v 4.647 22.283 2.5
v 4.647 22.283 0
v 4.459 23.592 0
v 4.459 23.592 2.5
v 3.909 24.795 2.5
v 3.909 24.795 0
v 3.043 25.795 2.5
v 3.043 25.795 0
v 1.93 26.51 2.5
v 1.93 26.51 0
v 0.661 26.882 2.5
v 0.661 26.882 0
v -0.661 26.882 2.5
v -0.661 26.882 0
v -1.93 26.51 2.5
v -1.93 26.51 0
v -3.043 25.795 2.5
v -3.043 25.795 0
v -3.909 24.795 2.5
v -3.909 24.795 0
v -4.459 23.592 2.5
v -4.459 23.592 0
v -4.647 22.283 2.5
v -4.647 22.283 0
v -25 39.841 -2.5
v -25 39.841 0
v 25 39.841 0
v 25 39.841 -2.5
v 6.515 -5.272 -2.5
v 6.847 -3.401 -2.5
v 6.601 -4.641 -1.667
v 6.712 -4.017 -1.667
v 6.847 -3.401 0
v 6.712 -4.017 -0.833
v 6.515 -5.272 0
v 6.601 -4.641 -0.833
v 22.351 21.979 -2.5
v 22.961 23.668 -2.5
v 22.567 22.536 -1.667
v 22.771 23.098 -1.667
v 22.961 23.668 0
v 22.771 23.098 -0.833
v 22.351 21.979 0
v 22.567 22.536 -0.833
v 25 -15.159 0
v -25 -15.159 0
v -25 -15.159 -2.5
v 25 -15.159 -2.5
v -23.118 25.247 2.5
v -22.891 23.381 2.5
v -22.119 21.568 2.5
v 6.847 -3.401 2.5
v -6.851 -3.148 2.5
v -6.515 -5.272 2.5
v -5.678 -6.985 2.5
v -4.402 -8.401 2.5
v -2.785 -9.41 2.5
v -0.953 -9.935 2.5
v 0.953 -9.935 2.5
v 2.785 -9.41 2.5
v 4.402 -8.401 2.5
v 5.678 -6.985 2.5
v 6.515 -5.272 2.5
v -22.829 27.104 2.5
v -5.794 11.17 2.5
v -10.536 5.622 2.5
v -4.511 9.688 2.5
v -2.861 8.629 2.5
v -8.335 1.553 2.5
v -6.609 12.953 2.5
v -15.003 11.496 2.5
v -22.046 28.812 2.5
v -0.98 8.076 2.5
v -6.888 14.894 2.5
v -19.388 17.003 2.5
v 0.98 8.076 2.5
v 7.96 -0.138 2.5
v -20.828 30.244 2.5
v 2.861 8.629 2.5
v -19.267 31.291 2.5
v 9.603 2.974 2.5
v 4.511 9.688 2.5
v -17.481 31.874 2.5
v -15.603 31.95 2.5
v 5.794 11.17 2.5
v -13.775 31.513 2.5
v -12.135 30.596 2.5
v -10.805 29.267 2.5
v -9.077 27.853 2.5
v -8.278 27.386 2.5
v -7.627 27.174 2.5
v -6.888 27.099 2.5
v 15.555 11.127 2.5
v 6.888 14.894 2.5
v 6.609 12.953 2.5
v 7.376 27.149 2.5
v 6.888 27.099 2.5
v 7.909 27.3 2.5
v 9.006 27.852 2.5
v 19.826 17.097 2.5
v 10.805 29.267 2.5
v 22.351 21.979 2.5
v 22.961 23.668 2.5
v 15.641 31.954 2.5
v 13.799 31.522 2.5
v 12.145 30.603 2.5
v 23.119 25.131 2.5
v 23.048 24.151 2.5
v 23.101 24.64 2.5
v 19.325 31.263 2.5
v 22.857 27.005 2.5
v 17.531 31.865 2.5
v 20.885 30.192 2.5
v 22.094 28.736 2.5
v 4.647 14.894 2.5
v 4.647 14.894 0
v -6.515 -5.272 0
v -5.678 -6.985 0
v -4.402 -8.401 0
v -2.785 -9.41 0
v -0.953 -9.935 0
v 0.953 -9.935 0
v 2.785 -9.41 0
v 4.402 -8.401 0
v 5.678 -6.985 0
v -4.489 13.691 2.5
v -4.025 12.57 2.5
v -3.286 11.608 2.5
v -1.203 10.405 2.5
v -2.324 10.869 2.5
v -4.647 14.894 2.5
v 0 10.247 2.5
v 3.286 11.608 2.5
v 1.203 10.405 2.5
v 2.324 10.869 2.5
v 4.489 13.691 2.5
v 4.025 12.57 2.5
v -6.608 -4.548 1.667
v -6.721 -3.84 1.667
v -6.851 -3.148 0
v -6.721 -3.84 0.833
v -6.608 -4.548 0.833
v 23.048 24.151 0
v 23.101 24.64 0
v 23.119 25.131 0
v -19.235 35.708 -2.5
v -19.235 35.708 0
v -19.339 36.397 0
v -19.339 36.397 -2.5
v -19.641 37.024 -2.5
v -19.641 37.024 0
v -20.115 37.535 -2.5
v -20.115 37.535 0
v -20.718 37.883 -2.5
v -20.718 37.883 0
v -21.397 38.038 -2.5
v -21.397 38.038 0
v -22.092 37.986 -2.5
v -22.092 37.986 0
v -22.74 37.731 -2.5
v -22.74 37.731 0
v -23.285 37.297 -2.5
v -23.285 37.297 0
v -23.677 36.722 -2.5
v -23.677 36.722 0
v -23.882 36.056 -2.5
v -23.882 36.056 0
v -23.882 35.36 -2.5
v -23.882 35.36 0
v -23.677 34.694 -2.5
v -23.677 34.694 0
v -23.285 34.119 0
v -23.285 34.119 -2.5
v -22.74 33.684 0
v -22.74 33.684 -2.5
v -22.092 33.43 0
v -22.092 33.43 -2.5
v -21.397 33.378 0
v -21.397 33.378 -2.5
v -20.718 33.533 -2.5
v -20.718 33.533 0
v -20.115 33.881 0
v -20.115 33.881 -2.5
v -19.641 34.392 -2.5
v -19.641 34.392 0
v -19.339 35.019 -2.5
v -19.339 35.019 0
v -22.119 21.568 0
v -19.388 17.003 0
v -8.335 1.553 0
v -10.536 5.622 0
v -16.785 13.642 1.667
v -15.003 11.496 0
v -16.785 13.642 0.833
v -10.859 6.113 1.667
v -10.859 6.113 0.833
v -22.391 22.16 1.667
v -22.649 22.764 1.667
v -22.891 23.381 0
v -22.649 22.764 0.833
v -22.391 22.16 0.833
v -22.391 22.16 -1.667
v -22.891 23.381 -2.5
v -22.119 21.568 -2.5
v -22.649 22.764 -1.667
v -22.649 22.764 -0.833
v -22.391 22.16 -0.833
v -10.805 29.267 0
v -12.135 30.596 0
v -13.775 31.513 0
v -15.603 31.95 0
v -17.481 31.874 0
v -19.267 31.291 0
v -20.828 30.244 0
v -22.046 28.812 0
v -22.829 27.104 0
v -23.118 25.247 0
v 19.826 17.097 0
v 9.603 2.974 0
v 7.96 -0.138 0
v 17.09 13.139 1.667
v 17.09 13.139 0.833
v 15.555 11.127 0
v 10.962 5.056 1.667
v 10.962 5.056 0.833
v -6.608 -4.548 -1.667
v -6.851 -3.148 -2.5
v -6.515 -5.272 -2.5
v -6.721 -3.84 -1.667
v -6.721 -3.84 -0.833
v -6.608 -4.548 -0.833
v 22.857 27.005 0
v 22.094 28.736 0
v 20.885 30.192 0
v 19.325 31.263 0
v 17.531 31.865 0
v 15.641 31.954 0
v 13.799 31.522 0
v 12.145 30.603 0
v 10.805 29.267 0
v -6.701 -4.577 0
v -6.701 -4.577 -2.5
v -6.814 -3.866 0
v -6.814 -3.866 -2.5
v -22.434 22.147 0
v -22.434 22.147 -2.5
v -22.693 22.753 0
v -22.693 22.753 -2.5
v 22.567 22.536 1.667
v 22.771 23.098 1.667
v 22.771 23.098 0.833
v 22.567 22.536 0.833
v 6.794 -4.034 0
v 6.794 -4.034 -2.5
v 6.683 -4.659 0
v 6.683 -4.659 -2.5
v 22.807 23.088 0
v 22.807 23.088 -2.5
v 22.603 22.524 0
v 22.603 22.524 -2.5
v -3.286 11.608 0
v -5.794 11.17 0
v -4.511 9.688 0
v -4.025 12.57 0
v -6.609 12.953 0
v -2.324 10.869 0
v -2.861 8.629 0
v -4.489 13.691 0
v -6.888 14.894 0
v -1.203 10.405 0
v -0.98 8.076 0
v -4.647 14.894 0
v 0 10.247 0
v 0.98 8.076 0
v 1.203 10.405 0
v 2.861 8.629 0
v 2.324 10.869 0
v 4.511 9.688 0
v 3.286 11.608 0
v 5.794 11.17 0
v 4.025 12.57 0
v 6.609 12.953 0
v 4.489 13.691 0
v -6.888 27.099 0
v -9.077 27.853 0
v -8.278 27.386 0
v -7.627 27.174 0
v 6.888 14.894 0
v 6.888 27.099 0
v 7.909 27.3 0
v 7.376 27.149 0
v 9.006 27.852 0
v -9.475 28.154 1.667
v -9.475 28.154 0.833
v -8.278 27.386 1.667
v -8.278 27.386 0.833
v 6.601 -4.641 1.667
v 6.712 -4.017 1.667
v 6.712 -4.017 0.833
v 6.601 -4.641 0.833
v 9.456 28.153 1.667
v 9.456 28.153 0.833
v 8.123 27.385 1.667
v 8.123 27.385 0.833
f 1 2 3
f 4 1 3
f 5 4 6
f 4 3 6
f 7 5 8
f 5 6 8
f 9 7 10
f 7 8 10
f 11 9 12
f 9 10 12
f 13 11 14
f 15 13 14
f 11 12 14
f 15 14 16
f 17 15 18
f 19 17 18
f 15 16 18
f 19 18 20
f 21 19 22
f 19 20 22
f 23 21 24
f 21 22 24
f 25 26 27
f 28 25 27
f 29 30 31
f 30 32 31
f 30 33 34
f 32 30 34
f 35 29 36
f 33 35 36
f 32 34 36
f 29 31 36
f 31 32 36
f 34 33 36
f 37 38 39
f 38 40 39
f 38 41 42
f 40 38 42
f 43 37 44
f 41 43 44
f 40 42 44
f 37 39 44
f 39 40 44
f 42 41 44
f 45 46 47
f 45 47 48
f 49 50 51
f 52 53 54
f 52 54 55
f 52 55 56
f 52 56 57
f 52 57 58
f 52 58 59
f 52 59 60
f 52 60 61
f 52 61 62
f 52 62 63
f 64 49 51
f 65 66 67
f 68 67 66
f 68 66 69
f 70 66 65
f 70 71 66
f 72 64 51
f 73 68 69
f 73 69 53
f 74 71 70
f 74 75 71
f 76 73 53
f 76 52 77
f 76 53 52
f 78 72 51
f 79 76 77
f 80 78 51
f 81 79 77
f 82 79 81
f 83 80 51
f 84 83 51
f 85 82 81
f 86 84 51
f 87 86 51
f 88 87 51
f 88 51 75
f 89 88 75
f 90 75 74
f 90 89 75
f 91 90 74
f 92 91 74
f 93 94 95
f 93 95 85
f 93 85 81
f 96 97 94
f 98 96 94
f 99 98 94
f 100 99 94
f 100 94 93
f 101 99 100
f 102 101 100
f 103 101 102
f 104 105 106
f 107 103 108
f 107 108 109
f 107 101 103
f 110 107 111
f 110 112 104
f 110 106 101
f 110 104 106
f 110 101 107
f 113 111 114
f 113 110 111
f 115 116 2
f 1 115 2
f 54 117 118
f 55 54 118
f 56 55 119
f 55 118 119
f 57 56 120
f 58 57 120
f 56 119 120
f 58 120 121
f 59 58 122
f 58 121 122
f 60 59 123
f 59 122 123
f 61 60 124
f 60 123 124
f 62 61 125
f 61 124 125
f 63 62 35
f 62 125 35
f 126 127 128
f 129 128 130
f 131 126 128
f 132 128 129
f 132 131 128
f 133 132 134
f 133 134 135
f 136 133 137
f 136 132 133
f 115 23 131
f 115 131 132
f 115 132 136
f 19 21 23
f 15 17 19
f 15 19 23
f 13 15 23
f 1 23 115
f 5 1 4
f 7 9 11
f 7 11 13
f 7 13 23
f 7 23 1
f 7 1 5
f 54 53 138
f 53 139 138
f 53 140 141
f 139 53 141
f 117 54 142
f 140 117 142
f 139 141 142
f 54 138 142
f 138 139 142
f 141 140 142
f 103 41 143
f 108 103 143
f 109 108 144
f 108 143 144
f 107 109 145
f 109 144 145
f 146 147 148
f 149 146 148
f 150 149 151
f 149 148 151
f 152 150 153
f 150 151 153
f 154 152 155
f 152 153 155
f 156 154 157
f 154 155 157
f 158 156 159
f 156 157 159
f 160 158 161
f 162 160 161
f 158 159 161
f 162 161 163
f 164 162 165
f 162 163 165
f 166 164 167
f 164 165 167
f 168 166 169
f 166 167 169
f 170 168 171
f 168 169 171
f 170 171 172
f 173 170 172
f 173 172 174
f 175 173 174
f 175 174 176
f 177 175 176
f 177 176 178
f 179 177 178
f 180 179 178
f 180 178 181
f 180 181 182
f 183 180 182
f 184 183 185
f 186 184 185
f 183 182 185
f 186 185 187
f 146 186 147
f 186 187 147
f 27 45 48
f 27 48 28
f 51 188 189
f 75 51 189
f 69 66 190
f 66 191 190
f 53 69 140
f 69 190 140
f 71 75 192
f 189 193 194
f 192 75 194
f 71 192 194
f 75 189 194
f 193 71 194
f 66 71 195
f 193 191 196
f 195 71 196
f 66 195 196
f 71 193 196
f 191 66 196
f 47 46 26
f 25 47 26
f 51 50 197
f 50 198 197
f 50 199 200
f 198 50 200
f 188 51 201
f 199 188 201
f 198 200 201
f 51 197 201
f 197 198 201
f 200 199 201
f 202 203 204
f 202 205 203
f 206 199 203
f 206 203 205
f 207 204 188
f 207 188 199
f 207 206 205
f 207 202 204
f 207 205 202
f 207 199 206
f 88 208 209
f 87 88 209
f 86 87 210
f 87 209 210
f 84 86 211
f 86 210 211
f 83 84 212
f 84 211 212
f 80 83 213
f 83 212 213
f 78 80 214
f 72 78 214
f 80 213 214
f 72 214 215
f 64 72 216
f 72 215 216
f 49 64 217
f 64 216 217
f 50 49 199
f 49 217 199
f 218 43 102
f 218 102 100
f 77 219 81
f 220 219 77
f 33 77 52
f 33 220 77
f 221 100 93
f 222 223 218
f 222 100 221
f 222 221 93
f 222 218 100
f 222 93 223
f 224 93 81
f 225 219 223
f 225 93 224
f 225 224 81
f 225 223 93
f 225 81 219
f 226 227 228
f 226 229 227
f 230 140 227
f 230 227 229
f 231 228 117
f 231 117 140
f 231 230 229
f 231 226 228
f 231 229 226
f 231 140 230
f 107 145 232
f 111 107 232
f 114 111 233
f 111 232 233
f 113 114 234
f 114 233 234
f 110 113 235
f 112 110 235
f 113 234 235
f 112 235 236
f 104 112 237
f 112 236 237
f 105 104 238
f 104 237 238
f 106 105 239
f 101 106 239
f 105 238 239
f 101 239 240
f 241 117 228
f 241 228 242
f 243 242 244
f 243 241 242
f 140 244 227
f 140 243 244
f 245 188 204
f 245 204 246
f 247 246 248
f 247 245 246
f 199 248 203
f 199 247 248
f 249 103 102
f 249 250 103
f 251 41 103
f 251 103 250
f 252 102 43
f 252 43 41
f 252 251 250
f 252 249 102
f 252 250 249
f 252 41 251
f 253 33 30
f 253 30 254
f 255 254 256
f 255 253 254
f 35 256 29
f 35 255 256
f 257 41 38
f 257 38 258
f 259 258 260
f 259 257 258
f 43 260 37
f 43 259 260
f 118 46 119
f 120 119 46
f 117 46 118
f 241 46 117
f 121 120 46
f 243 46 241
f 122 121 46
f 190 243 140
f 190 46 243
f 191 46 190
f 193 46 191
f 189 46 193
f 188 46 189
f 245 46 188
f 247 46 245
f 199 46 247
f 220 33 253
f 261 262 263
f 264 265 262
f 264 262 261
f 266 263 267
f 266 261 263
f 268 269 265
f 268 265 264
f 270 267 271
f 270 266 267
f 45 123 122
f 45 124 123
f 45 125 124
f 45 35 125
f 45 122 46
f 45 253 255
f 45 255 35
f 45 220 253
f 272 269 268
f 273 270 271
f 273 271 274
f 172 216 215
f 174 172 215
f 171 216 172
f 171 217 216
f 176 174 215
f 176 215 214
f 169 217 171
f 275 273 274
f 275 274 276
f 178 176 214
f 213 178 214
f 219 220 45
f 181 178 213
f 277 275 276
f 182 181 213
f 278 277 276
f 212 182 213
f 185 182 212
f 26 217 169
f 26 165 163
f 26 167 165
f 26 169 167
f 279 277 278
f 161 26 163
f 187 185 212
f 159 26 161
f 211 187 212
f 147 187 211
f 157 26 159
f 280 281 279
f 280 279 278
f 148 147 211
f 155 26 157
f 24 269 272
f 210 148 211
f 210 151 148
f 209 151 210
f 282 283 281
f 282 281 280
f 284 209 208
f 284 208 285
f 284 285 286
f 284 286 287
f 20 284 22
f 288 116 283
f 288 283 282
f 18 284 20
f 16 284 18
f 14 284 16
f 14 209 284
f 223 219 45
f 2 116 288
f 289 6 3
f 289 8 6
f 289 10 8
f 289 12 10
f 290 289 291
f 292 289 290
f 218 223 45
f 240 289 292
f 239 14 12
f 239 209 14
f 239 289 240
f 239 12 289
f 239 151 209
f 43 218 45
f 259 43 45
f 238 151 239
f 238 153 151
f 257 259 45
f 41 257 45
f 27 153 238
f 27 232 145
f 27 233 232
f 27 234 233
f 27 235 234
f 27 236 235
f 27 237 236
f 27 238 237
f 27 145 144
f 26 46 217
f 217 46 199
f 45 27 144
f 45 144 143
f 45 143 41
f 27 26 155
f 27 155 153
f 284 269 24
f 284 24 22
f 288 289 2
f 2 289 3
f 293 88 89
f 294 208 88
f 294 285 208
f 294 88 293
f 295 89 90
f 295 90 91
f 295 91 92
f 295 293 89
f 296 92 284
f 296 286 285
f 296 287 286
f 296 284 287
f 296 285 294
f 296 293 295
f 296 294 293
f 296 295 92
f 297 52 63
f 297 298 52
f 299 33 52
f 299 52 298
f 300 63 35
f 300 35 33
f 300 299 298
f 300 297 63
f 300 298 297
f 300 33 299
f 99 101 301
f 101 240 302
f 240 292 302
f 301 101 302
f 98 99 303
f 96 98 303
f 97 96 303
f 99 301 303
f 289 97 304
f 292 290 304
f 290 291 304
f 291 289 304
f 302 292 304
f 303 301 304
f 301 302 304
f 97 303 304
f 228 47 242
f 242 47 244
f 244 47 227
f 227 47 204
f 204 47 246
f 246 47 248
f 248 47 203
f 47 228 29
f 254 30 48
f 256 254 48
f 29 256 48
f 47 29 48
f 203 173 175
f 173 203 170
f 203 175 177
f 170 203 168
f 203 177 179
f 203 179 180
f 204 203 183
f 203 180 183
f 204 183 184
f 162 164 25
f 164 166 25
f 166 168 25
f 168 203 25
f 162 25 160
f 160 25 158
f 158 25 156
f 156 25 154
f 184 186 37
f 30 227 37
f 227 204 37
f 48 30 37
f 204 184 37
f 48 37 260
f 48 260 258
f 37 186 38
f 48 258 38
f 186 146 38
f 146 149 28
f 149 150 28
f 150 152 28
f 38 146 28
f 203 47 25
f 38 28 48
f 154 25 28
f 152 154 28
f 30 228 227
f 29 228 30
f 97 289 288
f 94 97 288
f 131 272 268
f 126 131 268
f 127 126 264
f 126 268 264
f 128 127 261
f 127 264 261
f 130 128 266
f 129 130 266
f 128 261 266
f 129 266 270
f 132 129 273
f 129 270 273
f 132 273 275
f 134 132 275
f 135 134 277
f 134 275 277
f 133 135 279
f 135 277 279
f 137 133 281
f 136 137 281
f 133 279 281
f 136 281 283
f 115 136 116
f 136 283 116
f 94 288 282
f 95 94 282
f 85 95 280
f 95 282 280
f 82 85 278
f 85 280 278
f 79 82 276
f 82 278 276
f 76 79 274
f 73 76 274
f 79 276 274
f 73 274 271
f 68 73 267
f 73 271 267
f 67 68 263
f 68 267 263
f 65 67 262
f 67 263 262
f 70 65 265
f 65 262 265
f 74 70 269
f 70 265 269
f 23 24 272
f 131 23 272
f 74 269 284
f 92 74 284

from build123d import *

# Parameters (mm, degrees)
F0_W     = 50
F0_H     = 55
F0_R     = 2.3365962568
F1_DEPTH = 2.5
F2_DEPTH = 2.5


with BuildPart() as f1:
    # F0 (on Top) → F1 (new body)
    with BuildSketch(Plane.XY):
        with Locations((0, 12.341101347)):
            Rectangle(F0_W, F0_H)
        with BuildLine():
            ThreePointArc((10.8052556607, 29.2671544041), (18.4488604009, 31.6259838811), (23.1186818497, 25.1312523575))
            ThreePointArc((23.1186818497, 25.1312523575), (23.0790338974, 24.3952437271), (22.9605489193, 23.6677535387))
            ThreePointArc((22.9605489193, 23.6677535387), (22.7111144002, 22.8034574753), (22.3505935824, 21.9792912273))
            add(Edge.make_bspline(
                [(22.3505935824, 21.9792912273), (18.484972418, 12.3846041121), (8.9944482287, 5.6182022343), (6.8467520485, -3.4005596444)],
                knots=[1.7047136512, 1.7047136512, 1.7047136512, 1.7047136512, 31.2766934929, 31.2766934929, 31.2766934929, 31.2766934929], degree=3))
            ThreePointArc((6.8467520485, -3.4005596444), (6.7459359262, -4.3477283467), (6.5147303328, -5.271761038))
            ThreePointArc((6.5147303328, -5.271761038), (0, -10.0020528135), (-6.5147303328, -5.271761038))
            ThreePointArc((-6.5147303328, -5.271761038), (-6.7668462793, -4.2232244294), (-6.851307477, -3.1481161668))
            add(Edge.make_bspline(
                [(-22.1192262656, 21.568073359), (-17.9179549259, 12.7340303131), (-9.0631935188, 7.6895660109), (-6.851307477, -3.1481161668)],
                knots=[1.9402705078, 1.9402705078, 1.9402705078, 1.9402705078, 31.1584988533, 31.1584988533, 31.1584988533, 31.1584988533], degree=3))
            ThreePointArc((-22.1192262656, 21.568073359), (-22.57078803, 22.4465939133), (-22.8913266517, 23.3809179381))
            ThreePointArc((-22.8913266517, 23.3809179381), (-19.2672755049, 31.2908798808), (-10.8052556607, 29.2671544041))
            add(Edge.make_bspline(
                [(-10.8052556607, 29.2671544041), (-9.3004167648, 28.0267296842), (-8.4820119868, 27.09910709), (-6.8878750083, 27.09910709)],
                knots=[0, 0, 0, 0, 4.4773094971, 4.4773094971, 4.4773094971, 4.4773094971], degree=3))
            Line((-6.8878750083, 27.09910709), (-6.8878750083, 14.8940041956))
            ThreePointArc((-6.8878750083, 14.8940041956), (0, 8.0061291873), (6.8878750083, 14.8940041956))
            Line((6.8878750083, 14.8940041956), (6.8878750083, 27.09910709))
            add(Edge.make_bspline(
                [(10.8052556607, 29.2671544041), (9.4734053303, 28.0257134136), (8.0485488803, 27.09910709), (6.8878750083, 27.09910709)],
                knots=[0, 0, 0, 0, 4.4773094971, 4.4773094971, 4.4773094971, 4.4773094971], degree=3))
        make_face(mode=Mode.SUBTRACT)
        with Locations((-21.5719379485, 35.7079468668)):
            Circle(F0_R, mode=Mode.SUBTRACT)
        with BuildLine():
            ThreePointArc((-4.6471344177, 22.2825248368), (0, 26.9296592545), (4.6471344177, 22.2825248368))
            Line((4.6471344177, 22.2825248368), (4.6471344177, 14.8940041956))
            ThreePointArc((4.6471344177, 14.8940041956), (3.2860202598, 11.6079839357), (0, 10.2468697779))
            ThreePointArc((0, 10.2468697779), (-3.2860202598, 11.6079839357), (-4.6471344177, 14.8940041956))
            Line((-4.6471344177, 14.8940041956), (-4.6471344177, 22.2825248368))
        make_face(mode=Mode.SUBTRACT)
        with BuildLine():
            ThreePointArc((22.3505935824, 21.9792912273), (12.6102330192, 19.3376574577), (10.8052556607, 29.2671544041))
            add(Edge.make_bspline(
                [(10.8052556607, 29.2671544041), (9.4734053303, 28.0257134136), (8.0485488803, 27.09910709), (6.8878750083, 27.09910709)],
                knots=[0, 0, 0, 0, 4.4773094971, 4.4773094971, 4.4773094971, 4.4773094971], degree=3))
            Line((6.8878750083, 27.09910709), (6.8878750083, 14.8940041956))
            ThreePointArc((6.8878750083, 14.8940041956), (0, 8.0061291873), (-6.8878750083, 14.8940041956))
            Line((-6.8878750083, 14.8940041956), (-6.8878750083, 27.09910709))
            add(Edge.make_bspline(
                [(-10.8052556607, 29.2671544041), (-9.3004167648, 28.0267296842), (-8.4820119868, 27.09910709), (-6.8878750083, 27.09910709)],
                knots=[0, 0, 0, 0, 4.4773094971, 4.4773094971, 4.4773094971, 4.4773094971], degree=3))
            ThreePointArc((-10.8052556607, 29.2671544041), (-9.7726423449, 27.31273889), (-9.4160658872, 25.1312523575))
            ThreePointArc((-9.4160658872, 25.1312523575), (-14.4170255201, 18.5345386269), (-22.1192262656, 21.568073359))
            add(Edge.make_bspline(
                [(-22.1192262656, 21.568073359), (-17.9179549259, 12.7340303131), (-9.0631935188, 7.6895660109), (-6.851307477, -3.1481161668)],
                knots=[1.9402705078, 1.9402705078, 1.9402705078, 1.9402705078, 31.1584988533, 31.1584988533, 31.1584988533, 31.1584988533], degree=3))
            ThreePointArc((-6.851307477, -3.1481161668), (0.0013143327, 3.700563023), (6.8513079813, -3.1507448322))
            ThreePointArc((6.8513079813, -3.1507448322), (6.8501689034, -3.2756730085), (6.8467520485, -3.4005596444))
            add(Edge.make_bspline(
                [(22.3505935824, 21.9792912273), (18.484972418, 12.3846041121), (8.9944482287, 5.6182022343), (6.8467520485, -3.4005596444)],
                knots=[1.7047136512, 1.7047136512, 1.7047136512, 1.7047136512, 31.2766934929, 31.2766934929, 31.2766934929, 31.2766934929], degree=3))
        make_face()
        with BuildLine():
            ThreePointArc((22.9605489193, 23.6677535387), (23.0790338974, 24.3952437271), (23.1186818497, 25.1312523575))
            ThreePointArc((23.1186818497, 25.1312523575), (18.4488604009, 31.6259838811), (10.8052556607, 29.2671544041))
            ThreePointArc((10.8052556607, 29.2671544041), (12.6102330192, 19.3376574577), (22.3505935824, 21.9792912273))
            add(Edge.make_bspline(
                [(22.9605489193, 23.6677535387), (22.7775786287, 23.0948852778), (22.5734321344, 22.5323889297), (22.3505935824, 21.9792912273)],
                knots=[0, 0, 0, 0, 1.7047136512, 1.7047136512, 1.7047136512, 1.7047136512], degree=3))
        make_face()
        with BuildLine():
            add(Edge.make_bspline(
                [(-22.8913266517, 23.3809179381), (-22.6566860437, 22.7580544126), (-22.3982165856, 22.1547082838), (-22.1192262656, 21.568073359)],
                knots=[0, 0, 0, 0, 1.9402705078, 1.9402705078, 1.9402705078, 1.9402705078], degree=3))
            ThreePointArc((-22.1192262656, 21.568073359), (-14.4170255201, 18.5345386269), (-9.4160658872, 25.1312523575))
            ThreePointArc((-9.4160658872, 25.1312523575), (-9.7726423449, 27.31273889), (-10.8052556607, 29.2671544041))
            ThreePointArc((-10.8052556607, 29.2671544041), (-19.2672755049, 31.2908798808), (-22.8913266517, 23.3809179381))
        make_face()
        with BuildLine():
            add(Edge.make_bspline(
                [(6.8467520485, -3.4005596444), (6.7008211488, -4.0133632838), (6.5887912239, -4.6365658048), (6.5147303328, -5.271761038)],
                knots=[31.2766934929, 31.2766934929, 31.2766934929, 31.2766934929, 33.2860399103, 33.2860399103, 33.2860399103, 33.2860399103], degree=3))
            ThreePointArc((6.8467520485, -3.4005596444), (6.8501689034, -3.2756730085), (6.8513079813, -3.1507448322))
            ThreePointArc((6.8513079813, -3.1507448322), (0.0013143327, 3.700563023), (-6.851307477, -3.1481161668))
            add(Edge.make_bspline(
                [(-6.851307477, -3.1481161668), (-6.7117079268, -3.8321186553), (-6.5985689132, -4.5391972434), (-6.5147303328, -5.271761038)],
                knots=[31.1584988533, 31.1584988533, 31.1584988533, 31.1584988533, 33.0025592871, 33.0025592871, 33.0025592871, 33.0025592871], degree=3))
            ThreePointArc((-6.5147303328, -5.271761038), (0, -10.0020528135), (6.5147303328, -5.271761038))
        make_face()
        with BuildLine():
            ThreePointArc((2.819272775, 18.5882645162), (4.1651769375, 20.2216610918), (4.6471344177, 22.2825248368))
            ThreePointArc((4.6471344177, 22.2825248368), (0, 26.9296592545), (-4.6471344177, 22.2825248368))
            ThreePointArc((-4.6471344177, 22.2825248368), (-4.1651769375, 20.2216610918), (-2.819272775, 18.5882645162))
            ThreePointArc((-2.819272775, 18.5882645162), (0, 19.5411386133), (2.819272775, 18.5882645162))
        make_face()
        with BuildLine():
            ThreePointArc((4.6471344177, 14.8940041956), (4.1651769375, 16.9548679405), (2.819272775, 18.5882645162))
            ThreePointArc((2.819272775, 18.5882645162), (1.4879741282, 17.8800492502), (0, 17.6353904191))
            Line((0, 17.6353904191), (0, 10.2468697779))
            ThreePointArc((0, 10.2468697779), (3.2860202598, 11.6079839357), (4.6471344177, 14.8940041956))
        make_face()
        with BuildLine():
            ThreePointArc((0, 17.6353904191), (-1.4879741282, 17.8800492502), (-2.819272775, 18.5882645162))
            ThreePointArc((-2.819272775, 18.5882645162), (-4.1651769375, 16.9548679405), (-4.6471344177, 14.8940041956))
            ThreePointArc((-4.6471344177, 14.8940041956), (-3.2860202598, 11.6079839357), (0, 10.2468697779))
            Line((0, 10.2468697779), (0, 17.6353904191))
        make_face()
        with BuildLine():
            ThreePointArc((0, 17.6353904191), (1.4879741282, 17.8800492502), (2.819272775, 18.5882645162))
            ThreePointArc((2.819272775, 18.5882645162), (0, 19.5411386133), (-2.819272775, 18.5882645162))
            ThreePointArc((-2.819272775, 18.5882645162), (-1.4879741282, 17.8800492502), (0, 17.6353904191))
        make_face()
        with BuildLine():
            Line((4.6471344177, 14.8940041956), (4.6471344177, 22.2825248368))
            ThreePointArc((4.6471344177, 22.2825248368), (4.1651769375, 20.2216610918), (2.819272775, 18.5882645162))
            ThreePointArc((2.819272775, 18.5882645162), (4.1651769375, 16.9548679405), (4.6471344177, 14.8940041956))
        make_face()
        with BuildLine():
            ThreePointArc((-2.819272775, 18.5882645162), (-4.1651769375, 20.2216610918), (-4.6471344177, 22.2825248368))
            Line((-4.6471344177, 22.2825248368), (-4.6471344177, 14.8940041956))
            ThreePointArc((-4.6471344177, 14.8940041956), (-4.1651769375, 16.9548679405), (-2.819272775, 18.5882645162))
        make_face()
    extrude(amount=-F1_DEPTH)

    # F0 (on Top) → F2 (join)
    with BuildSketch(Plane.XY):
        with BuildLine():
            ThreePointArc((2.819272775, 18.5882645162), (4.1651769375, 20.2216610918), (4.6471344177, 22.2825248368))
            ThreePointArc((4.6471344177, 22.2825248368), (0, 26.9296592545), (-4.6471344177, 22.2825248368))
            ThreePointArc((-4.6471344177, 22.2825248368), (-4.1651769375, 20.2216610918), (-2.819272775, 18.5882645162))
            ThreePointArc((-2.819272775, 18.5882645162), (0, 19.5411386133), (2.819272775, 18.5882645162))
        make_face()
        with BuildLine():
            Line((4.6471344177, 14.8940041956), (4.6471344177, 22.2825248368))
            ThreePointArc((4.6471344177, 22.2825248368), (4.1651769375, 20.2216610918), (2.819272775, 18.5882645162))
            ThreePointArc((2.819272775, 18.5882645162), (4.1651769375, 16.9548679405), (4.6471344177, 14.8940041956))
        make_face()
        with BuildLine():
            ThreePointArc((-2.819272775, 18.5882645162), (-4.1651769375, 20.2216610918), (-4.6471344177, 22.2825248368))
            Line((-4.6471344177, 22.2825248368), (-4.6471344177, 14.8940041956))
            ThreePointArc((-4.6471344177, 14.8940041956), (-4.1651769375, 16.9548679405), (-2.819272775, 18.5882645162))
        make_face()
        with BuildLine():
            ThreePointArc((4.6471344177, 14.8940041956), (4.1651769375, 16.9548679405), (2.819272775, 18.5882645162))
            ThreePointArc((2.819272775, 18.5882645162), (1.4879741282, 17.8800492502), (0, 17.6353904191))
            Line((0, 17.6353904191), (0, 10.2468697779))
            ThreePointArc((0, 10.2468697779), (3.2860202598, 11.6079839357), (4.6471344177, 14.8940041956))
        make_face()
        with BuildLine():
            ThreePointArc((0, 17.6353904191), (1.4879741282, 17.8800492502), (2.819272775, 18.5882645162))
            ThreePointArc((2.819272775, 18.5882645162), (0, 19.5411386133), (-2.819272775, 18.5882645162))
            ThreePointArc((-2.819272775, 18.5882645162), (-1.4879741282, 17.8800492502), (0, 17.6353904191))
        make_face()
        with BuildLine():
            ThreePointArc((0, 17.6353904191), (-1.4879741282, 17.8800492502), (-2.819272775, 18.5882645162))
            ThreePointArc((-2.819272775, 18.5882645162), (-4.1651769375, 16.9548679405), (-4.6471344177, 14.8940041956))
            ThreePointArc((-4.6471344177, 14.8940041956), (-3.2860202598, 11.6079839357), (0, 10.2468697779))
            Line((0, 10.2468697779), (0, 17.6353904191))
        make_face()
        with BuildLine():
            ThreePointArc((22.9605489193, 23.6677535387), (23.0790338974, 24.3952437271), (23.1186818497, 25.1312523575))
            ThreePointArc((23.1186818497, 25.1312523575), (18.4488604009, 31.6259838811), (10.8052556607, 29.2671544041))
            ThreePointArc((10.8052556607, 29.2671544041), (12.6102330192, 19.3376574577), (22.3505935824, 21.9792912273))
            add(Edge.make_bspline(
                [(22.9605489193, 23.6677535387), (22.7775786287, 23.0948852778), (22.5734321344, 22.5323889297), (22.3505935824, 21.9792912273)],
                knots=[0, 0, 0, 0, 1.7047136512, 1.7047136512, 1.7047136512, 1.7047136512], degree=3))
        make_face()
        with BuildLine():
            ThreePointArc((22.3505935824, 21.9792912273), (12.6102330192, 19.3376574577), (10.8052556607, 29.2671544041))
            add(Edge.make_bspline(
                [(10.8052556607, 29.2671544041), (9.4734053303, 28.0257134136), (8.0485488803, 27.09910709), (6.8878750083, 27.09910709)],
                knots=[0, 0, 0, 0, 4.4773094971, 4.4773094971, 4.4773094971, 4.4773094971], degree=3))
            Line((6.8878750083, 27.09910709), (6.8878750083, 14.8940041956))
            ThreePointArc((6.8878750083, 14.8940041956), (0, 8.0061291873), (-6.8878750083, 14.8940041956))
            Line((-6.8878750083, 14.8940041956), (-6.8878750083, 27.09910709))
            add(Edge.make_bspline(
                [(-10.8052556607, 29.2671544041), (-9.3004167648, 28.0267296842), (-8.4820119868, 27.09910709), (-6.8878750083, 27.09910709)],
                knots=[0, 0, 0, 0, 4.4773094971, 4.4773094971, 4.4773094971, 4.4773094971], degree=3))
            ThreePointArc((-10.8052556607, 29.2671544041), (-9.7726423449, 27.31273889), (-9.4160658872, 25.1312523575))
            ThreePointArc((-9.4160658872, 25.1312523575), (-14.4170255201, 18.5345386269), (-22.1192262656, 21.568073359))
            add(Edge.make_bspline(
                [(-22.1192262656, 21.568073359), (-17.9179549259, 12.7340303131), (-9.0631935188, 7.6895660109), (-6.851307477, -3.1481161668)],
                knots=[1.9402705078, 1.9402705078, 1.9402705078, 1.9402705078, 31.1584988533, 31.1584988533, 31.1584988533, 31.1584988533], degree=3))
            ThreePointArc((-6.851307477, -3.1481161668), (0.0013143327, 3.700563023), (6.8513079813, -3.1507448322))
            ThreePointArc((6.8513079813, -3.1507448322), (6.8501689034, -3.2756730085), (6.8467520485, -3.4005596444))
            add(Edge.make_bspline(
                [(22.3505935824, 21.9792912273), (18.484972418, 12.3846041121), (8.9944482287, 5.6182022343), (6.8467520485, -3.4005596444)],
                knots=[1.7047136512, 1.7047136512, 1.7047136512, 1.7047136512, 31.2766934929, 31.2766934929, 31.2766934929, 31.2766934929], degree=3))
        make_face()
        with BuildLine():
            add(Edge.make_bspline(
                [(6.8467520485, -3.4005596444), (6.7008211488, -4.0133632838), (6.5887912239, -4.6365658048), (6.5147303328, -5.271761038)],
                knots=[31.2766934929, 31.2766934929, 31.2766934929, 31.2766934929, 33.2860399103, 33.2860399103, 33.2860399103, 33.2860399103], degree=3))
            ThreePointArc((6.8467520485, -3.4005596444), (6.8501689034, -3.2756730085), (6.8513079813, -3.1507448322))
            ThreePointArc((6.8513079813, -3.1507448322), (0.0013143327, 3.700563023), (-6.851307477, -3.1481161668))
            add(Edge.make_bspline(
                [(-6.851307477, -3.1481161668), (-6.7117079268, -3.8321186553), (-6.5985689132, -4.5391972434), (-6.5147303328, -5.271761038)],
                knots=[31.1584988533, 31.1584988533, 31.1584988533, 31.1584988533, 33.0025592871, 33.0025592871, 33.0025592871, 33.0025592871], degree=3))
            ThreePointArc((-6.5147303328, -5.271761038), (0, -10.0020528135), (6.5147303328, -5.271761038))
        make_face()
        with BuildLine():
            add(Edge.make_bspline(
                [(-22.8913266517, 23.3809179381), (-22.6566860437, 22.7580544126), (-22.3982165856, 22.1547082838), (-22.1192262656, 21.568073359)],
                knots=[0, 0, 0, 0, 1.9402705078, 1.9402705078, 1.9402705078, 1.9402705078], degree=3))
            ThreePointArc((-22.1192262656, 21.568073359), (-14.4170255201, 18.5345386269), (-9.4160658872, 25.1312523575))
            ThreePointArc((-9.4160658872, 25.1312523575), (-9.7726423449, 27.31273889), (-10.8052556607, 29.2671544041))
            ThreePointArc((-10.8052556607, 29.2671544041), (-19.2672755049, 31.2908798808), (-22.8913266517, 23.3809179381))
        make_face()
    extrude(amount=F2_DEPTH)


solid = f1.part
